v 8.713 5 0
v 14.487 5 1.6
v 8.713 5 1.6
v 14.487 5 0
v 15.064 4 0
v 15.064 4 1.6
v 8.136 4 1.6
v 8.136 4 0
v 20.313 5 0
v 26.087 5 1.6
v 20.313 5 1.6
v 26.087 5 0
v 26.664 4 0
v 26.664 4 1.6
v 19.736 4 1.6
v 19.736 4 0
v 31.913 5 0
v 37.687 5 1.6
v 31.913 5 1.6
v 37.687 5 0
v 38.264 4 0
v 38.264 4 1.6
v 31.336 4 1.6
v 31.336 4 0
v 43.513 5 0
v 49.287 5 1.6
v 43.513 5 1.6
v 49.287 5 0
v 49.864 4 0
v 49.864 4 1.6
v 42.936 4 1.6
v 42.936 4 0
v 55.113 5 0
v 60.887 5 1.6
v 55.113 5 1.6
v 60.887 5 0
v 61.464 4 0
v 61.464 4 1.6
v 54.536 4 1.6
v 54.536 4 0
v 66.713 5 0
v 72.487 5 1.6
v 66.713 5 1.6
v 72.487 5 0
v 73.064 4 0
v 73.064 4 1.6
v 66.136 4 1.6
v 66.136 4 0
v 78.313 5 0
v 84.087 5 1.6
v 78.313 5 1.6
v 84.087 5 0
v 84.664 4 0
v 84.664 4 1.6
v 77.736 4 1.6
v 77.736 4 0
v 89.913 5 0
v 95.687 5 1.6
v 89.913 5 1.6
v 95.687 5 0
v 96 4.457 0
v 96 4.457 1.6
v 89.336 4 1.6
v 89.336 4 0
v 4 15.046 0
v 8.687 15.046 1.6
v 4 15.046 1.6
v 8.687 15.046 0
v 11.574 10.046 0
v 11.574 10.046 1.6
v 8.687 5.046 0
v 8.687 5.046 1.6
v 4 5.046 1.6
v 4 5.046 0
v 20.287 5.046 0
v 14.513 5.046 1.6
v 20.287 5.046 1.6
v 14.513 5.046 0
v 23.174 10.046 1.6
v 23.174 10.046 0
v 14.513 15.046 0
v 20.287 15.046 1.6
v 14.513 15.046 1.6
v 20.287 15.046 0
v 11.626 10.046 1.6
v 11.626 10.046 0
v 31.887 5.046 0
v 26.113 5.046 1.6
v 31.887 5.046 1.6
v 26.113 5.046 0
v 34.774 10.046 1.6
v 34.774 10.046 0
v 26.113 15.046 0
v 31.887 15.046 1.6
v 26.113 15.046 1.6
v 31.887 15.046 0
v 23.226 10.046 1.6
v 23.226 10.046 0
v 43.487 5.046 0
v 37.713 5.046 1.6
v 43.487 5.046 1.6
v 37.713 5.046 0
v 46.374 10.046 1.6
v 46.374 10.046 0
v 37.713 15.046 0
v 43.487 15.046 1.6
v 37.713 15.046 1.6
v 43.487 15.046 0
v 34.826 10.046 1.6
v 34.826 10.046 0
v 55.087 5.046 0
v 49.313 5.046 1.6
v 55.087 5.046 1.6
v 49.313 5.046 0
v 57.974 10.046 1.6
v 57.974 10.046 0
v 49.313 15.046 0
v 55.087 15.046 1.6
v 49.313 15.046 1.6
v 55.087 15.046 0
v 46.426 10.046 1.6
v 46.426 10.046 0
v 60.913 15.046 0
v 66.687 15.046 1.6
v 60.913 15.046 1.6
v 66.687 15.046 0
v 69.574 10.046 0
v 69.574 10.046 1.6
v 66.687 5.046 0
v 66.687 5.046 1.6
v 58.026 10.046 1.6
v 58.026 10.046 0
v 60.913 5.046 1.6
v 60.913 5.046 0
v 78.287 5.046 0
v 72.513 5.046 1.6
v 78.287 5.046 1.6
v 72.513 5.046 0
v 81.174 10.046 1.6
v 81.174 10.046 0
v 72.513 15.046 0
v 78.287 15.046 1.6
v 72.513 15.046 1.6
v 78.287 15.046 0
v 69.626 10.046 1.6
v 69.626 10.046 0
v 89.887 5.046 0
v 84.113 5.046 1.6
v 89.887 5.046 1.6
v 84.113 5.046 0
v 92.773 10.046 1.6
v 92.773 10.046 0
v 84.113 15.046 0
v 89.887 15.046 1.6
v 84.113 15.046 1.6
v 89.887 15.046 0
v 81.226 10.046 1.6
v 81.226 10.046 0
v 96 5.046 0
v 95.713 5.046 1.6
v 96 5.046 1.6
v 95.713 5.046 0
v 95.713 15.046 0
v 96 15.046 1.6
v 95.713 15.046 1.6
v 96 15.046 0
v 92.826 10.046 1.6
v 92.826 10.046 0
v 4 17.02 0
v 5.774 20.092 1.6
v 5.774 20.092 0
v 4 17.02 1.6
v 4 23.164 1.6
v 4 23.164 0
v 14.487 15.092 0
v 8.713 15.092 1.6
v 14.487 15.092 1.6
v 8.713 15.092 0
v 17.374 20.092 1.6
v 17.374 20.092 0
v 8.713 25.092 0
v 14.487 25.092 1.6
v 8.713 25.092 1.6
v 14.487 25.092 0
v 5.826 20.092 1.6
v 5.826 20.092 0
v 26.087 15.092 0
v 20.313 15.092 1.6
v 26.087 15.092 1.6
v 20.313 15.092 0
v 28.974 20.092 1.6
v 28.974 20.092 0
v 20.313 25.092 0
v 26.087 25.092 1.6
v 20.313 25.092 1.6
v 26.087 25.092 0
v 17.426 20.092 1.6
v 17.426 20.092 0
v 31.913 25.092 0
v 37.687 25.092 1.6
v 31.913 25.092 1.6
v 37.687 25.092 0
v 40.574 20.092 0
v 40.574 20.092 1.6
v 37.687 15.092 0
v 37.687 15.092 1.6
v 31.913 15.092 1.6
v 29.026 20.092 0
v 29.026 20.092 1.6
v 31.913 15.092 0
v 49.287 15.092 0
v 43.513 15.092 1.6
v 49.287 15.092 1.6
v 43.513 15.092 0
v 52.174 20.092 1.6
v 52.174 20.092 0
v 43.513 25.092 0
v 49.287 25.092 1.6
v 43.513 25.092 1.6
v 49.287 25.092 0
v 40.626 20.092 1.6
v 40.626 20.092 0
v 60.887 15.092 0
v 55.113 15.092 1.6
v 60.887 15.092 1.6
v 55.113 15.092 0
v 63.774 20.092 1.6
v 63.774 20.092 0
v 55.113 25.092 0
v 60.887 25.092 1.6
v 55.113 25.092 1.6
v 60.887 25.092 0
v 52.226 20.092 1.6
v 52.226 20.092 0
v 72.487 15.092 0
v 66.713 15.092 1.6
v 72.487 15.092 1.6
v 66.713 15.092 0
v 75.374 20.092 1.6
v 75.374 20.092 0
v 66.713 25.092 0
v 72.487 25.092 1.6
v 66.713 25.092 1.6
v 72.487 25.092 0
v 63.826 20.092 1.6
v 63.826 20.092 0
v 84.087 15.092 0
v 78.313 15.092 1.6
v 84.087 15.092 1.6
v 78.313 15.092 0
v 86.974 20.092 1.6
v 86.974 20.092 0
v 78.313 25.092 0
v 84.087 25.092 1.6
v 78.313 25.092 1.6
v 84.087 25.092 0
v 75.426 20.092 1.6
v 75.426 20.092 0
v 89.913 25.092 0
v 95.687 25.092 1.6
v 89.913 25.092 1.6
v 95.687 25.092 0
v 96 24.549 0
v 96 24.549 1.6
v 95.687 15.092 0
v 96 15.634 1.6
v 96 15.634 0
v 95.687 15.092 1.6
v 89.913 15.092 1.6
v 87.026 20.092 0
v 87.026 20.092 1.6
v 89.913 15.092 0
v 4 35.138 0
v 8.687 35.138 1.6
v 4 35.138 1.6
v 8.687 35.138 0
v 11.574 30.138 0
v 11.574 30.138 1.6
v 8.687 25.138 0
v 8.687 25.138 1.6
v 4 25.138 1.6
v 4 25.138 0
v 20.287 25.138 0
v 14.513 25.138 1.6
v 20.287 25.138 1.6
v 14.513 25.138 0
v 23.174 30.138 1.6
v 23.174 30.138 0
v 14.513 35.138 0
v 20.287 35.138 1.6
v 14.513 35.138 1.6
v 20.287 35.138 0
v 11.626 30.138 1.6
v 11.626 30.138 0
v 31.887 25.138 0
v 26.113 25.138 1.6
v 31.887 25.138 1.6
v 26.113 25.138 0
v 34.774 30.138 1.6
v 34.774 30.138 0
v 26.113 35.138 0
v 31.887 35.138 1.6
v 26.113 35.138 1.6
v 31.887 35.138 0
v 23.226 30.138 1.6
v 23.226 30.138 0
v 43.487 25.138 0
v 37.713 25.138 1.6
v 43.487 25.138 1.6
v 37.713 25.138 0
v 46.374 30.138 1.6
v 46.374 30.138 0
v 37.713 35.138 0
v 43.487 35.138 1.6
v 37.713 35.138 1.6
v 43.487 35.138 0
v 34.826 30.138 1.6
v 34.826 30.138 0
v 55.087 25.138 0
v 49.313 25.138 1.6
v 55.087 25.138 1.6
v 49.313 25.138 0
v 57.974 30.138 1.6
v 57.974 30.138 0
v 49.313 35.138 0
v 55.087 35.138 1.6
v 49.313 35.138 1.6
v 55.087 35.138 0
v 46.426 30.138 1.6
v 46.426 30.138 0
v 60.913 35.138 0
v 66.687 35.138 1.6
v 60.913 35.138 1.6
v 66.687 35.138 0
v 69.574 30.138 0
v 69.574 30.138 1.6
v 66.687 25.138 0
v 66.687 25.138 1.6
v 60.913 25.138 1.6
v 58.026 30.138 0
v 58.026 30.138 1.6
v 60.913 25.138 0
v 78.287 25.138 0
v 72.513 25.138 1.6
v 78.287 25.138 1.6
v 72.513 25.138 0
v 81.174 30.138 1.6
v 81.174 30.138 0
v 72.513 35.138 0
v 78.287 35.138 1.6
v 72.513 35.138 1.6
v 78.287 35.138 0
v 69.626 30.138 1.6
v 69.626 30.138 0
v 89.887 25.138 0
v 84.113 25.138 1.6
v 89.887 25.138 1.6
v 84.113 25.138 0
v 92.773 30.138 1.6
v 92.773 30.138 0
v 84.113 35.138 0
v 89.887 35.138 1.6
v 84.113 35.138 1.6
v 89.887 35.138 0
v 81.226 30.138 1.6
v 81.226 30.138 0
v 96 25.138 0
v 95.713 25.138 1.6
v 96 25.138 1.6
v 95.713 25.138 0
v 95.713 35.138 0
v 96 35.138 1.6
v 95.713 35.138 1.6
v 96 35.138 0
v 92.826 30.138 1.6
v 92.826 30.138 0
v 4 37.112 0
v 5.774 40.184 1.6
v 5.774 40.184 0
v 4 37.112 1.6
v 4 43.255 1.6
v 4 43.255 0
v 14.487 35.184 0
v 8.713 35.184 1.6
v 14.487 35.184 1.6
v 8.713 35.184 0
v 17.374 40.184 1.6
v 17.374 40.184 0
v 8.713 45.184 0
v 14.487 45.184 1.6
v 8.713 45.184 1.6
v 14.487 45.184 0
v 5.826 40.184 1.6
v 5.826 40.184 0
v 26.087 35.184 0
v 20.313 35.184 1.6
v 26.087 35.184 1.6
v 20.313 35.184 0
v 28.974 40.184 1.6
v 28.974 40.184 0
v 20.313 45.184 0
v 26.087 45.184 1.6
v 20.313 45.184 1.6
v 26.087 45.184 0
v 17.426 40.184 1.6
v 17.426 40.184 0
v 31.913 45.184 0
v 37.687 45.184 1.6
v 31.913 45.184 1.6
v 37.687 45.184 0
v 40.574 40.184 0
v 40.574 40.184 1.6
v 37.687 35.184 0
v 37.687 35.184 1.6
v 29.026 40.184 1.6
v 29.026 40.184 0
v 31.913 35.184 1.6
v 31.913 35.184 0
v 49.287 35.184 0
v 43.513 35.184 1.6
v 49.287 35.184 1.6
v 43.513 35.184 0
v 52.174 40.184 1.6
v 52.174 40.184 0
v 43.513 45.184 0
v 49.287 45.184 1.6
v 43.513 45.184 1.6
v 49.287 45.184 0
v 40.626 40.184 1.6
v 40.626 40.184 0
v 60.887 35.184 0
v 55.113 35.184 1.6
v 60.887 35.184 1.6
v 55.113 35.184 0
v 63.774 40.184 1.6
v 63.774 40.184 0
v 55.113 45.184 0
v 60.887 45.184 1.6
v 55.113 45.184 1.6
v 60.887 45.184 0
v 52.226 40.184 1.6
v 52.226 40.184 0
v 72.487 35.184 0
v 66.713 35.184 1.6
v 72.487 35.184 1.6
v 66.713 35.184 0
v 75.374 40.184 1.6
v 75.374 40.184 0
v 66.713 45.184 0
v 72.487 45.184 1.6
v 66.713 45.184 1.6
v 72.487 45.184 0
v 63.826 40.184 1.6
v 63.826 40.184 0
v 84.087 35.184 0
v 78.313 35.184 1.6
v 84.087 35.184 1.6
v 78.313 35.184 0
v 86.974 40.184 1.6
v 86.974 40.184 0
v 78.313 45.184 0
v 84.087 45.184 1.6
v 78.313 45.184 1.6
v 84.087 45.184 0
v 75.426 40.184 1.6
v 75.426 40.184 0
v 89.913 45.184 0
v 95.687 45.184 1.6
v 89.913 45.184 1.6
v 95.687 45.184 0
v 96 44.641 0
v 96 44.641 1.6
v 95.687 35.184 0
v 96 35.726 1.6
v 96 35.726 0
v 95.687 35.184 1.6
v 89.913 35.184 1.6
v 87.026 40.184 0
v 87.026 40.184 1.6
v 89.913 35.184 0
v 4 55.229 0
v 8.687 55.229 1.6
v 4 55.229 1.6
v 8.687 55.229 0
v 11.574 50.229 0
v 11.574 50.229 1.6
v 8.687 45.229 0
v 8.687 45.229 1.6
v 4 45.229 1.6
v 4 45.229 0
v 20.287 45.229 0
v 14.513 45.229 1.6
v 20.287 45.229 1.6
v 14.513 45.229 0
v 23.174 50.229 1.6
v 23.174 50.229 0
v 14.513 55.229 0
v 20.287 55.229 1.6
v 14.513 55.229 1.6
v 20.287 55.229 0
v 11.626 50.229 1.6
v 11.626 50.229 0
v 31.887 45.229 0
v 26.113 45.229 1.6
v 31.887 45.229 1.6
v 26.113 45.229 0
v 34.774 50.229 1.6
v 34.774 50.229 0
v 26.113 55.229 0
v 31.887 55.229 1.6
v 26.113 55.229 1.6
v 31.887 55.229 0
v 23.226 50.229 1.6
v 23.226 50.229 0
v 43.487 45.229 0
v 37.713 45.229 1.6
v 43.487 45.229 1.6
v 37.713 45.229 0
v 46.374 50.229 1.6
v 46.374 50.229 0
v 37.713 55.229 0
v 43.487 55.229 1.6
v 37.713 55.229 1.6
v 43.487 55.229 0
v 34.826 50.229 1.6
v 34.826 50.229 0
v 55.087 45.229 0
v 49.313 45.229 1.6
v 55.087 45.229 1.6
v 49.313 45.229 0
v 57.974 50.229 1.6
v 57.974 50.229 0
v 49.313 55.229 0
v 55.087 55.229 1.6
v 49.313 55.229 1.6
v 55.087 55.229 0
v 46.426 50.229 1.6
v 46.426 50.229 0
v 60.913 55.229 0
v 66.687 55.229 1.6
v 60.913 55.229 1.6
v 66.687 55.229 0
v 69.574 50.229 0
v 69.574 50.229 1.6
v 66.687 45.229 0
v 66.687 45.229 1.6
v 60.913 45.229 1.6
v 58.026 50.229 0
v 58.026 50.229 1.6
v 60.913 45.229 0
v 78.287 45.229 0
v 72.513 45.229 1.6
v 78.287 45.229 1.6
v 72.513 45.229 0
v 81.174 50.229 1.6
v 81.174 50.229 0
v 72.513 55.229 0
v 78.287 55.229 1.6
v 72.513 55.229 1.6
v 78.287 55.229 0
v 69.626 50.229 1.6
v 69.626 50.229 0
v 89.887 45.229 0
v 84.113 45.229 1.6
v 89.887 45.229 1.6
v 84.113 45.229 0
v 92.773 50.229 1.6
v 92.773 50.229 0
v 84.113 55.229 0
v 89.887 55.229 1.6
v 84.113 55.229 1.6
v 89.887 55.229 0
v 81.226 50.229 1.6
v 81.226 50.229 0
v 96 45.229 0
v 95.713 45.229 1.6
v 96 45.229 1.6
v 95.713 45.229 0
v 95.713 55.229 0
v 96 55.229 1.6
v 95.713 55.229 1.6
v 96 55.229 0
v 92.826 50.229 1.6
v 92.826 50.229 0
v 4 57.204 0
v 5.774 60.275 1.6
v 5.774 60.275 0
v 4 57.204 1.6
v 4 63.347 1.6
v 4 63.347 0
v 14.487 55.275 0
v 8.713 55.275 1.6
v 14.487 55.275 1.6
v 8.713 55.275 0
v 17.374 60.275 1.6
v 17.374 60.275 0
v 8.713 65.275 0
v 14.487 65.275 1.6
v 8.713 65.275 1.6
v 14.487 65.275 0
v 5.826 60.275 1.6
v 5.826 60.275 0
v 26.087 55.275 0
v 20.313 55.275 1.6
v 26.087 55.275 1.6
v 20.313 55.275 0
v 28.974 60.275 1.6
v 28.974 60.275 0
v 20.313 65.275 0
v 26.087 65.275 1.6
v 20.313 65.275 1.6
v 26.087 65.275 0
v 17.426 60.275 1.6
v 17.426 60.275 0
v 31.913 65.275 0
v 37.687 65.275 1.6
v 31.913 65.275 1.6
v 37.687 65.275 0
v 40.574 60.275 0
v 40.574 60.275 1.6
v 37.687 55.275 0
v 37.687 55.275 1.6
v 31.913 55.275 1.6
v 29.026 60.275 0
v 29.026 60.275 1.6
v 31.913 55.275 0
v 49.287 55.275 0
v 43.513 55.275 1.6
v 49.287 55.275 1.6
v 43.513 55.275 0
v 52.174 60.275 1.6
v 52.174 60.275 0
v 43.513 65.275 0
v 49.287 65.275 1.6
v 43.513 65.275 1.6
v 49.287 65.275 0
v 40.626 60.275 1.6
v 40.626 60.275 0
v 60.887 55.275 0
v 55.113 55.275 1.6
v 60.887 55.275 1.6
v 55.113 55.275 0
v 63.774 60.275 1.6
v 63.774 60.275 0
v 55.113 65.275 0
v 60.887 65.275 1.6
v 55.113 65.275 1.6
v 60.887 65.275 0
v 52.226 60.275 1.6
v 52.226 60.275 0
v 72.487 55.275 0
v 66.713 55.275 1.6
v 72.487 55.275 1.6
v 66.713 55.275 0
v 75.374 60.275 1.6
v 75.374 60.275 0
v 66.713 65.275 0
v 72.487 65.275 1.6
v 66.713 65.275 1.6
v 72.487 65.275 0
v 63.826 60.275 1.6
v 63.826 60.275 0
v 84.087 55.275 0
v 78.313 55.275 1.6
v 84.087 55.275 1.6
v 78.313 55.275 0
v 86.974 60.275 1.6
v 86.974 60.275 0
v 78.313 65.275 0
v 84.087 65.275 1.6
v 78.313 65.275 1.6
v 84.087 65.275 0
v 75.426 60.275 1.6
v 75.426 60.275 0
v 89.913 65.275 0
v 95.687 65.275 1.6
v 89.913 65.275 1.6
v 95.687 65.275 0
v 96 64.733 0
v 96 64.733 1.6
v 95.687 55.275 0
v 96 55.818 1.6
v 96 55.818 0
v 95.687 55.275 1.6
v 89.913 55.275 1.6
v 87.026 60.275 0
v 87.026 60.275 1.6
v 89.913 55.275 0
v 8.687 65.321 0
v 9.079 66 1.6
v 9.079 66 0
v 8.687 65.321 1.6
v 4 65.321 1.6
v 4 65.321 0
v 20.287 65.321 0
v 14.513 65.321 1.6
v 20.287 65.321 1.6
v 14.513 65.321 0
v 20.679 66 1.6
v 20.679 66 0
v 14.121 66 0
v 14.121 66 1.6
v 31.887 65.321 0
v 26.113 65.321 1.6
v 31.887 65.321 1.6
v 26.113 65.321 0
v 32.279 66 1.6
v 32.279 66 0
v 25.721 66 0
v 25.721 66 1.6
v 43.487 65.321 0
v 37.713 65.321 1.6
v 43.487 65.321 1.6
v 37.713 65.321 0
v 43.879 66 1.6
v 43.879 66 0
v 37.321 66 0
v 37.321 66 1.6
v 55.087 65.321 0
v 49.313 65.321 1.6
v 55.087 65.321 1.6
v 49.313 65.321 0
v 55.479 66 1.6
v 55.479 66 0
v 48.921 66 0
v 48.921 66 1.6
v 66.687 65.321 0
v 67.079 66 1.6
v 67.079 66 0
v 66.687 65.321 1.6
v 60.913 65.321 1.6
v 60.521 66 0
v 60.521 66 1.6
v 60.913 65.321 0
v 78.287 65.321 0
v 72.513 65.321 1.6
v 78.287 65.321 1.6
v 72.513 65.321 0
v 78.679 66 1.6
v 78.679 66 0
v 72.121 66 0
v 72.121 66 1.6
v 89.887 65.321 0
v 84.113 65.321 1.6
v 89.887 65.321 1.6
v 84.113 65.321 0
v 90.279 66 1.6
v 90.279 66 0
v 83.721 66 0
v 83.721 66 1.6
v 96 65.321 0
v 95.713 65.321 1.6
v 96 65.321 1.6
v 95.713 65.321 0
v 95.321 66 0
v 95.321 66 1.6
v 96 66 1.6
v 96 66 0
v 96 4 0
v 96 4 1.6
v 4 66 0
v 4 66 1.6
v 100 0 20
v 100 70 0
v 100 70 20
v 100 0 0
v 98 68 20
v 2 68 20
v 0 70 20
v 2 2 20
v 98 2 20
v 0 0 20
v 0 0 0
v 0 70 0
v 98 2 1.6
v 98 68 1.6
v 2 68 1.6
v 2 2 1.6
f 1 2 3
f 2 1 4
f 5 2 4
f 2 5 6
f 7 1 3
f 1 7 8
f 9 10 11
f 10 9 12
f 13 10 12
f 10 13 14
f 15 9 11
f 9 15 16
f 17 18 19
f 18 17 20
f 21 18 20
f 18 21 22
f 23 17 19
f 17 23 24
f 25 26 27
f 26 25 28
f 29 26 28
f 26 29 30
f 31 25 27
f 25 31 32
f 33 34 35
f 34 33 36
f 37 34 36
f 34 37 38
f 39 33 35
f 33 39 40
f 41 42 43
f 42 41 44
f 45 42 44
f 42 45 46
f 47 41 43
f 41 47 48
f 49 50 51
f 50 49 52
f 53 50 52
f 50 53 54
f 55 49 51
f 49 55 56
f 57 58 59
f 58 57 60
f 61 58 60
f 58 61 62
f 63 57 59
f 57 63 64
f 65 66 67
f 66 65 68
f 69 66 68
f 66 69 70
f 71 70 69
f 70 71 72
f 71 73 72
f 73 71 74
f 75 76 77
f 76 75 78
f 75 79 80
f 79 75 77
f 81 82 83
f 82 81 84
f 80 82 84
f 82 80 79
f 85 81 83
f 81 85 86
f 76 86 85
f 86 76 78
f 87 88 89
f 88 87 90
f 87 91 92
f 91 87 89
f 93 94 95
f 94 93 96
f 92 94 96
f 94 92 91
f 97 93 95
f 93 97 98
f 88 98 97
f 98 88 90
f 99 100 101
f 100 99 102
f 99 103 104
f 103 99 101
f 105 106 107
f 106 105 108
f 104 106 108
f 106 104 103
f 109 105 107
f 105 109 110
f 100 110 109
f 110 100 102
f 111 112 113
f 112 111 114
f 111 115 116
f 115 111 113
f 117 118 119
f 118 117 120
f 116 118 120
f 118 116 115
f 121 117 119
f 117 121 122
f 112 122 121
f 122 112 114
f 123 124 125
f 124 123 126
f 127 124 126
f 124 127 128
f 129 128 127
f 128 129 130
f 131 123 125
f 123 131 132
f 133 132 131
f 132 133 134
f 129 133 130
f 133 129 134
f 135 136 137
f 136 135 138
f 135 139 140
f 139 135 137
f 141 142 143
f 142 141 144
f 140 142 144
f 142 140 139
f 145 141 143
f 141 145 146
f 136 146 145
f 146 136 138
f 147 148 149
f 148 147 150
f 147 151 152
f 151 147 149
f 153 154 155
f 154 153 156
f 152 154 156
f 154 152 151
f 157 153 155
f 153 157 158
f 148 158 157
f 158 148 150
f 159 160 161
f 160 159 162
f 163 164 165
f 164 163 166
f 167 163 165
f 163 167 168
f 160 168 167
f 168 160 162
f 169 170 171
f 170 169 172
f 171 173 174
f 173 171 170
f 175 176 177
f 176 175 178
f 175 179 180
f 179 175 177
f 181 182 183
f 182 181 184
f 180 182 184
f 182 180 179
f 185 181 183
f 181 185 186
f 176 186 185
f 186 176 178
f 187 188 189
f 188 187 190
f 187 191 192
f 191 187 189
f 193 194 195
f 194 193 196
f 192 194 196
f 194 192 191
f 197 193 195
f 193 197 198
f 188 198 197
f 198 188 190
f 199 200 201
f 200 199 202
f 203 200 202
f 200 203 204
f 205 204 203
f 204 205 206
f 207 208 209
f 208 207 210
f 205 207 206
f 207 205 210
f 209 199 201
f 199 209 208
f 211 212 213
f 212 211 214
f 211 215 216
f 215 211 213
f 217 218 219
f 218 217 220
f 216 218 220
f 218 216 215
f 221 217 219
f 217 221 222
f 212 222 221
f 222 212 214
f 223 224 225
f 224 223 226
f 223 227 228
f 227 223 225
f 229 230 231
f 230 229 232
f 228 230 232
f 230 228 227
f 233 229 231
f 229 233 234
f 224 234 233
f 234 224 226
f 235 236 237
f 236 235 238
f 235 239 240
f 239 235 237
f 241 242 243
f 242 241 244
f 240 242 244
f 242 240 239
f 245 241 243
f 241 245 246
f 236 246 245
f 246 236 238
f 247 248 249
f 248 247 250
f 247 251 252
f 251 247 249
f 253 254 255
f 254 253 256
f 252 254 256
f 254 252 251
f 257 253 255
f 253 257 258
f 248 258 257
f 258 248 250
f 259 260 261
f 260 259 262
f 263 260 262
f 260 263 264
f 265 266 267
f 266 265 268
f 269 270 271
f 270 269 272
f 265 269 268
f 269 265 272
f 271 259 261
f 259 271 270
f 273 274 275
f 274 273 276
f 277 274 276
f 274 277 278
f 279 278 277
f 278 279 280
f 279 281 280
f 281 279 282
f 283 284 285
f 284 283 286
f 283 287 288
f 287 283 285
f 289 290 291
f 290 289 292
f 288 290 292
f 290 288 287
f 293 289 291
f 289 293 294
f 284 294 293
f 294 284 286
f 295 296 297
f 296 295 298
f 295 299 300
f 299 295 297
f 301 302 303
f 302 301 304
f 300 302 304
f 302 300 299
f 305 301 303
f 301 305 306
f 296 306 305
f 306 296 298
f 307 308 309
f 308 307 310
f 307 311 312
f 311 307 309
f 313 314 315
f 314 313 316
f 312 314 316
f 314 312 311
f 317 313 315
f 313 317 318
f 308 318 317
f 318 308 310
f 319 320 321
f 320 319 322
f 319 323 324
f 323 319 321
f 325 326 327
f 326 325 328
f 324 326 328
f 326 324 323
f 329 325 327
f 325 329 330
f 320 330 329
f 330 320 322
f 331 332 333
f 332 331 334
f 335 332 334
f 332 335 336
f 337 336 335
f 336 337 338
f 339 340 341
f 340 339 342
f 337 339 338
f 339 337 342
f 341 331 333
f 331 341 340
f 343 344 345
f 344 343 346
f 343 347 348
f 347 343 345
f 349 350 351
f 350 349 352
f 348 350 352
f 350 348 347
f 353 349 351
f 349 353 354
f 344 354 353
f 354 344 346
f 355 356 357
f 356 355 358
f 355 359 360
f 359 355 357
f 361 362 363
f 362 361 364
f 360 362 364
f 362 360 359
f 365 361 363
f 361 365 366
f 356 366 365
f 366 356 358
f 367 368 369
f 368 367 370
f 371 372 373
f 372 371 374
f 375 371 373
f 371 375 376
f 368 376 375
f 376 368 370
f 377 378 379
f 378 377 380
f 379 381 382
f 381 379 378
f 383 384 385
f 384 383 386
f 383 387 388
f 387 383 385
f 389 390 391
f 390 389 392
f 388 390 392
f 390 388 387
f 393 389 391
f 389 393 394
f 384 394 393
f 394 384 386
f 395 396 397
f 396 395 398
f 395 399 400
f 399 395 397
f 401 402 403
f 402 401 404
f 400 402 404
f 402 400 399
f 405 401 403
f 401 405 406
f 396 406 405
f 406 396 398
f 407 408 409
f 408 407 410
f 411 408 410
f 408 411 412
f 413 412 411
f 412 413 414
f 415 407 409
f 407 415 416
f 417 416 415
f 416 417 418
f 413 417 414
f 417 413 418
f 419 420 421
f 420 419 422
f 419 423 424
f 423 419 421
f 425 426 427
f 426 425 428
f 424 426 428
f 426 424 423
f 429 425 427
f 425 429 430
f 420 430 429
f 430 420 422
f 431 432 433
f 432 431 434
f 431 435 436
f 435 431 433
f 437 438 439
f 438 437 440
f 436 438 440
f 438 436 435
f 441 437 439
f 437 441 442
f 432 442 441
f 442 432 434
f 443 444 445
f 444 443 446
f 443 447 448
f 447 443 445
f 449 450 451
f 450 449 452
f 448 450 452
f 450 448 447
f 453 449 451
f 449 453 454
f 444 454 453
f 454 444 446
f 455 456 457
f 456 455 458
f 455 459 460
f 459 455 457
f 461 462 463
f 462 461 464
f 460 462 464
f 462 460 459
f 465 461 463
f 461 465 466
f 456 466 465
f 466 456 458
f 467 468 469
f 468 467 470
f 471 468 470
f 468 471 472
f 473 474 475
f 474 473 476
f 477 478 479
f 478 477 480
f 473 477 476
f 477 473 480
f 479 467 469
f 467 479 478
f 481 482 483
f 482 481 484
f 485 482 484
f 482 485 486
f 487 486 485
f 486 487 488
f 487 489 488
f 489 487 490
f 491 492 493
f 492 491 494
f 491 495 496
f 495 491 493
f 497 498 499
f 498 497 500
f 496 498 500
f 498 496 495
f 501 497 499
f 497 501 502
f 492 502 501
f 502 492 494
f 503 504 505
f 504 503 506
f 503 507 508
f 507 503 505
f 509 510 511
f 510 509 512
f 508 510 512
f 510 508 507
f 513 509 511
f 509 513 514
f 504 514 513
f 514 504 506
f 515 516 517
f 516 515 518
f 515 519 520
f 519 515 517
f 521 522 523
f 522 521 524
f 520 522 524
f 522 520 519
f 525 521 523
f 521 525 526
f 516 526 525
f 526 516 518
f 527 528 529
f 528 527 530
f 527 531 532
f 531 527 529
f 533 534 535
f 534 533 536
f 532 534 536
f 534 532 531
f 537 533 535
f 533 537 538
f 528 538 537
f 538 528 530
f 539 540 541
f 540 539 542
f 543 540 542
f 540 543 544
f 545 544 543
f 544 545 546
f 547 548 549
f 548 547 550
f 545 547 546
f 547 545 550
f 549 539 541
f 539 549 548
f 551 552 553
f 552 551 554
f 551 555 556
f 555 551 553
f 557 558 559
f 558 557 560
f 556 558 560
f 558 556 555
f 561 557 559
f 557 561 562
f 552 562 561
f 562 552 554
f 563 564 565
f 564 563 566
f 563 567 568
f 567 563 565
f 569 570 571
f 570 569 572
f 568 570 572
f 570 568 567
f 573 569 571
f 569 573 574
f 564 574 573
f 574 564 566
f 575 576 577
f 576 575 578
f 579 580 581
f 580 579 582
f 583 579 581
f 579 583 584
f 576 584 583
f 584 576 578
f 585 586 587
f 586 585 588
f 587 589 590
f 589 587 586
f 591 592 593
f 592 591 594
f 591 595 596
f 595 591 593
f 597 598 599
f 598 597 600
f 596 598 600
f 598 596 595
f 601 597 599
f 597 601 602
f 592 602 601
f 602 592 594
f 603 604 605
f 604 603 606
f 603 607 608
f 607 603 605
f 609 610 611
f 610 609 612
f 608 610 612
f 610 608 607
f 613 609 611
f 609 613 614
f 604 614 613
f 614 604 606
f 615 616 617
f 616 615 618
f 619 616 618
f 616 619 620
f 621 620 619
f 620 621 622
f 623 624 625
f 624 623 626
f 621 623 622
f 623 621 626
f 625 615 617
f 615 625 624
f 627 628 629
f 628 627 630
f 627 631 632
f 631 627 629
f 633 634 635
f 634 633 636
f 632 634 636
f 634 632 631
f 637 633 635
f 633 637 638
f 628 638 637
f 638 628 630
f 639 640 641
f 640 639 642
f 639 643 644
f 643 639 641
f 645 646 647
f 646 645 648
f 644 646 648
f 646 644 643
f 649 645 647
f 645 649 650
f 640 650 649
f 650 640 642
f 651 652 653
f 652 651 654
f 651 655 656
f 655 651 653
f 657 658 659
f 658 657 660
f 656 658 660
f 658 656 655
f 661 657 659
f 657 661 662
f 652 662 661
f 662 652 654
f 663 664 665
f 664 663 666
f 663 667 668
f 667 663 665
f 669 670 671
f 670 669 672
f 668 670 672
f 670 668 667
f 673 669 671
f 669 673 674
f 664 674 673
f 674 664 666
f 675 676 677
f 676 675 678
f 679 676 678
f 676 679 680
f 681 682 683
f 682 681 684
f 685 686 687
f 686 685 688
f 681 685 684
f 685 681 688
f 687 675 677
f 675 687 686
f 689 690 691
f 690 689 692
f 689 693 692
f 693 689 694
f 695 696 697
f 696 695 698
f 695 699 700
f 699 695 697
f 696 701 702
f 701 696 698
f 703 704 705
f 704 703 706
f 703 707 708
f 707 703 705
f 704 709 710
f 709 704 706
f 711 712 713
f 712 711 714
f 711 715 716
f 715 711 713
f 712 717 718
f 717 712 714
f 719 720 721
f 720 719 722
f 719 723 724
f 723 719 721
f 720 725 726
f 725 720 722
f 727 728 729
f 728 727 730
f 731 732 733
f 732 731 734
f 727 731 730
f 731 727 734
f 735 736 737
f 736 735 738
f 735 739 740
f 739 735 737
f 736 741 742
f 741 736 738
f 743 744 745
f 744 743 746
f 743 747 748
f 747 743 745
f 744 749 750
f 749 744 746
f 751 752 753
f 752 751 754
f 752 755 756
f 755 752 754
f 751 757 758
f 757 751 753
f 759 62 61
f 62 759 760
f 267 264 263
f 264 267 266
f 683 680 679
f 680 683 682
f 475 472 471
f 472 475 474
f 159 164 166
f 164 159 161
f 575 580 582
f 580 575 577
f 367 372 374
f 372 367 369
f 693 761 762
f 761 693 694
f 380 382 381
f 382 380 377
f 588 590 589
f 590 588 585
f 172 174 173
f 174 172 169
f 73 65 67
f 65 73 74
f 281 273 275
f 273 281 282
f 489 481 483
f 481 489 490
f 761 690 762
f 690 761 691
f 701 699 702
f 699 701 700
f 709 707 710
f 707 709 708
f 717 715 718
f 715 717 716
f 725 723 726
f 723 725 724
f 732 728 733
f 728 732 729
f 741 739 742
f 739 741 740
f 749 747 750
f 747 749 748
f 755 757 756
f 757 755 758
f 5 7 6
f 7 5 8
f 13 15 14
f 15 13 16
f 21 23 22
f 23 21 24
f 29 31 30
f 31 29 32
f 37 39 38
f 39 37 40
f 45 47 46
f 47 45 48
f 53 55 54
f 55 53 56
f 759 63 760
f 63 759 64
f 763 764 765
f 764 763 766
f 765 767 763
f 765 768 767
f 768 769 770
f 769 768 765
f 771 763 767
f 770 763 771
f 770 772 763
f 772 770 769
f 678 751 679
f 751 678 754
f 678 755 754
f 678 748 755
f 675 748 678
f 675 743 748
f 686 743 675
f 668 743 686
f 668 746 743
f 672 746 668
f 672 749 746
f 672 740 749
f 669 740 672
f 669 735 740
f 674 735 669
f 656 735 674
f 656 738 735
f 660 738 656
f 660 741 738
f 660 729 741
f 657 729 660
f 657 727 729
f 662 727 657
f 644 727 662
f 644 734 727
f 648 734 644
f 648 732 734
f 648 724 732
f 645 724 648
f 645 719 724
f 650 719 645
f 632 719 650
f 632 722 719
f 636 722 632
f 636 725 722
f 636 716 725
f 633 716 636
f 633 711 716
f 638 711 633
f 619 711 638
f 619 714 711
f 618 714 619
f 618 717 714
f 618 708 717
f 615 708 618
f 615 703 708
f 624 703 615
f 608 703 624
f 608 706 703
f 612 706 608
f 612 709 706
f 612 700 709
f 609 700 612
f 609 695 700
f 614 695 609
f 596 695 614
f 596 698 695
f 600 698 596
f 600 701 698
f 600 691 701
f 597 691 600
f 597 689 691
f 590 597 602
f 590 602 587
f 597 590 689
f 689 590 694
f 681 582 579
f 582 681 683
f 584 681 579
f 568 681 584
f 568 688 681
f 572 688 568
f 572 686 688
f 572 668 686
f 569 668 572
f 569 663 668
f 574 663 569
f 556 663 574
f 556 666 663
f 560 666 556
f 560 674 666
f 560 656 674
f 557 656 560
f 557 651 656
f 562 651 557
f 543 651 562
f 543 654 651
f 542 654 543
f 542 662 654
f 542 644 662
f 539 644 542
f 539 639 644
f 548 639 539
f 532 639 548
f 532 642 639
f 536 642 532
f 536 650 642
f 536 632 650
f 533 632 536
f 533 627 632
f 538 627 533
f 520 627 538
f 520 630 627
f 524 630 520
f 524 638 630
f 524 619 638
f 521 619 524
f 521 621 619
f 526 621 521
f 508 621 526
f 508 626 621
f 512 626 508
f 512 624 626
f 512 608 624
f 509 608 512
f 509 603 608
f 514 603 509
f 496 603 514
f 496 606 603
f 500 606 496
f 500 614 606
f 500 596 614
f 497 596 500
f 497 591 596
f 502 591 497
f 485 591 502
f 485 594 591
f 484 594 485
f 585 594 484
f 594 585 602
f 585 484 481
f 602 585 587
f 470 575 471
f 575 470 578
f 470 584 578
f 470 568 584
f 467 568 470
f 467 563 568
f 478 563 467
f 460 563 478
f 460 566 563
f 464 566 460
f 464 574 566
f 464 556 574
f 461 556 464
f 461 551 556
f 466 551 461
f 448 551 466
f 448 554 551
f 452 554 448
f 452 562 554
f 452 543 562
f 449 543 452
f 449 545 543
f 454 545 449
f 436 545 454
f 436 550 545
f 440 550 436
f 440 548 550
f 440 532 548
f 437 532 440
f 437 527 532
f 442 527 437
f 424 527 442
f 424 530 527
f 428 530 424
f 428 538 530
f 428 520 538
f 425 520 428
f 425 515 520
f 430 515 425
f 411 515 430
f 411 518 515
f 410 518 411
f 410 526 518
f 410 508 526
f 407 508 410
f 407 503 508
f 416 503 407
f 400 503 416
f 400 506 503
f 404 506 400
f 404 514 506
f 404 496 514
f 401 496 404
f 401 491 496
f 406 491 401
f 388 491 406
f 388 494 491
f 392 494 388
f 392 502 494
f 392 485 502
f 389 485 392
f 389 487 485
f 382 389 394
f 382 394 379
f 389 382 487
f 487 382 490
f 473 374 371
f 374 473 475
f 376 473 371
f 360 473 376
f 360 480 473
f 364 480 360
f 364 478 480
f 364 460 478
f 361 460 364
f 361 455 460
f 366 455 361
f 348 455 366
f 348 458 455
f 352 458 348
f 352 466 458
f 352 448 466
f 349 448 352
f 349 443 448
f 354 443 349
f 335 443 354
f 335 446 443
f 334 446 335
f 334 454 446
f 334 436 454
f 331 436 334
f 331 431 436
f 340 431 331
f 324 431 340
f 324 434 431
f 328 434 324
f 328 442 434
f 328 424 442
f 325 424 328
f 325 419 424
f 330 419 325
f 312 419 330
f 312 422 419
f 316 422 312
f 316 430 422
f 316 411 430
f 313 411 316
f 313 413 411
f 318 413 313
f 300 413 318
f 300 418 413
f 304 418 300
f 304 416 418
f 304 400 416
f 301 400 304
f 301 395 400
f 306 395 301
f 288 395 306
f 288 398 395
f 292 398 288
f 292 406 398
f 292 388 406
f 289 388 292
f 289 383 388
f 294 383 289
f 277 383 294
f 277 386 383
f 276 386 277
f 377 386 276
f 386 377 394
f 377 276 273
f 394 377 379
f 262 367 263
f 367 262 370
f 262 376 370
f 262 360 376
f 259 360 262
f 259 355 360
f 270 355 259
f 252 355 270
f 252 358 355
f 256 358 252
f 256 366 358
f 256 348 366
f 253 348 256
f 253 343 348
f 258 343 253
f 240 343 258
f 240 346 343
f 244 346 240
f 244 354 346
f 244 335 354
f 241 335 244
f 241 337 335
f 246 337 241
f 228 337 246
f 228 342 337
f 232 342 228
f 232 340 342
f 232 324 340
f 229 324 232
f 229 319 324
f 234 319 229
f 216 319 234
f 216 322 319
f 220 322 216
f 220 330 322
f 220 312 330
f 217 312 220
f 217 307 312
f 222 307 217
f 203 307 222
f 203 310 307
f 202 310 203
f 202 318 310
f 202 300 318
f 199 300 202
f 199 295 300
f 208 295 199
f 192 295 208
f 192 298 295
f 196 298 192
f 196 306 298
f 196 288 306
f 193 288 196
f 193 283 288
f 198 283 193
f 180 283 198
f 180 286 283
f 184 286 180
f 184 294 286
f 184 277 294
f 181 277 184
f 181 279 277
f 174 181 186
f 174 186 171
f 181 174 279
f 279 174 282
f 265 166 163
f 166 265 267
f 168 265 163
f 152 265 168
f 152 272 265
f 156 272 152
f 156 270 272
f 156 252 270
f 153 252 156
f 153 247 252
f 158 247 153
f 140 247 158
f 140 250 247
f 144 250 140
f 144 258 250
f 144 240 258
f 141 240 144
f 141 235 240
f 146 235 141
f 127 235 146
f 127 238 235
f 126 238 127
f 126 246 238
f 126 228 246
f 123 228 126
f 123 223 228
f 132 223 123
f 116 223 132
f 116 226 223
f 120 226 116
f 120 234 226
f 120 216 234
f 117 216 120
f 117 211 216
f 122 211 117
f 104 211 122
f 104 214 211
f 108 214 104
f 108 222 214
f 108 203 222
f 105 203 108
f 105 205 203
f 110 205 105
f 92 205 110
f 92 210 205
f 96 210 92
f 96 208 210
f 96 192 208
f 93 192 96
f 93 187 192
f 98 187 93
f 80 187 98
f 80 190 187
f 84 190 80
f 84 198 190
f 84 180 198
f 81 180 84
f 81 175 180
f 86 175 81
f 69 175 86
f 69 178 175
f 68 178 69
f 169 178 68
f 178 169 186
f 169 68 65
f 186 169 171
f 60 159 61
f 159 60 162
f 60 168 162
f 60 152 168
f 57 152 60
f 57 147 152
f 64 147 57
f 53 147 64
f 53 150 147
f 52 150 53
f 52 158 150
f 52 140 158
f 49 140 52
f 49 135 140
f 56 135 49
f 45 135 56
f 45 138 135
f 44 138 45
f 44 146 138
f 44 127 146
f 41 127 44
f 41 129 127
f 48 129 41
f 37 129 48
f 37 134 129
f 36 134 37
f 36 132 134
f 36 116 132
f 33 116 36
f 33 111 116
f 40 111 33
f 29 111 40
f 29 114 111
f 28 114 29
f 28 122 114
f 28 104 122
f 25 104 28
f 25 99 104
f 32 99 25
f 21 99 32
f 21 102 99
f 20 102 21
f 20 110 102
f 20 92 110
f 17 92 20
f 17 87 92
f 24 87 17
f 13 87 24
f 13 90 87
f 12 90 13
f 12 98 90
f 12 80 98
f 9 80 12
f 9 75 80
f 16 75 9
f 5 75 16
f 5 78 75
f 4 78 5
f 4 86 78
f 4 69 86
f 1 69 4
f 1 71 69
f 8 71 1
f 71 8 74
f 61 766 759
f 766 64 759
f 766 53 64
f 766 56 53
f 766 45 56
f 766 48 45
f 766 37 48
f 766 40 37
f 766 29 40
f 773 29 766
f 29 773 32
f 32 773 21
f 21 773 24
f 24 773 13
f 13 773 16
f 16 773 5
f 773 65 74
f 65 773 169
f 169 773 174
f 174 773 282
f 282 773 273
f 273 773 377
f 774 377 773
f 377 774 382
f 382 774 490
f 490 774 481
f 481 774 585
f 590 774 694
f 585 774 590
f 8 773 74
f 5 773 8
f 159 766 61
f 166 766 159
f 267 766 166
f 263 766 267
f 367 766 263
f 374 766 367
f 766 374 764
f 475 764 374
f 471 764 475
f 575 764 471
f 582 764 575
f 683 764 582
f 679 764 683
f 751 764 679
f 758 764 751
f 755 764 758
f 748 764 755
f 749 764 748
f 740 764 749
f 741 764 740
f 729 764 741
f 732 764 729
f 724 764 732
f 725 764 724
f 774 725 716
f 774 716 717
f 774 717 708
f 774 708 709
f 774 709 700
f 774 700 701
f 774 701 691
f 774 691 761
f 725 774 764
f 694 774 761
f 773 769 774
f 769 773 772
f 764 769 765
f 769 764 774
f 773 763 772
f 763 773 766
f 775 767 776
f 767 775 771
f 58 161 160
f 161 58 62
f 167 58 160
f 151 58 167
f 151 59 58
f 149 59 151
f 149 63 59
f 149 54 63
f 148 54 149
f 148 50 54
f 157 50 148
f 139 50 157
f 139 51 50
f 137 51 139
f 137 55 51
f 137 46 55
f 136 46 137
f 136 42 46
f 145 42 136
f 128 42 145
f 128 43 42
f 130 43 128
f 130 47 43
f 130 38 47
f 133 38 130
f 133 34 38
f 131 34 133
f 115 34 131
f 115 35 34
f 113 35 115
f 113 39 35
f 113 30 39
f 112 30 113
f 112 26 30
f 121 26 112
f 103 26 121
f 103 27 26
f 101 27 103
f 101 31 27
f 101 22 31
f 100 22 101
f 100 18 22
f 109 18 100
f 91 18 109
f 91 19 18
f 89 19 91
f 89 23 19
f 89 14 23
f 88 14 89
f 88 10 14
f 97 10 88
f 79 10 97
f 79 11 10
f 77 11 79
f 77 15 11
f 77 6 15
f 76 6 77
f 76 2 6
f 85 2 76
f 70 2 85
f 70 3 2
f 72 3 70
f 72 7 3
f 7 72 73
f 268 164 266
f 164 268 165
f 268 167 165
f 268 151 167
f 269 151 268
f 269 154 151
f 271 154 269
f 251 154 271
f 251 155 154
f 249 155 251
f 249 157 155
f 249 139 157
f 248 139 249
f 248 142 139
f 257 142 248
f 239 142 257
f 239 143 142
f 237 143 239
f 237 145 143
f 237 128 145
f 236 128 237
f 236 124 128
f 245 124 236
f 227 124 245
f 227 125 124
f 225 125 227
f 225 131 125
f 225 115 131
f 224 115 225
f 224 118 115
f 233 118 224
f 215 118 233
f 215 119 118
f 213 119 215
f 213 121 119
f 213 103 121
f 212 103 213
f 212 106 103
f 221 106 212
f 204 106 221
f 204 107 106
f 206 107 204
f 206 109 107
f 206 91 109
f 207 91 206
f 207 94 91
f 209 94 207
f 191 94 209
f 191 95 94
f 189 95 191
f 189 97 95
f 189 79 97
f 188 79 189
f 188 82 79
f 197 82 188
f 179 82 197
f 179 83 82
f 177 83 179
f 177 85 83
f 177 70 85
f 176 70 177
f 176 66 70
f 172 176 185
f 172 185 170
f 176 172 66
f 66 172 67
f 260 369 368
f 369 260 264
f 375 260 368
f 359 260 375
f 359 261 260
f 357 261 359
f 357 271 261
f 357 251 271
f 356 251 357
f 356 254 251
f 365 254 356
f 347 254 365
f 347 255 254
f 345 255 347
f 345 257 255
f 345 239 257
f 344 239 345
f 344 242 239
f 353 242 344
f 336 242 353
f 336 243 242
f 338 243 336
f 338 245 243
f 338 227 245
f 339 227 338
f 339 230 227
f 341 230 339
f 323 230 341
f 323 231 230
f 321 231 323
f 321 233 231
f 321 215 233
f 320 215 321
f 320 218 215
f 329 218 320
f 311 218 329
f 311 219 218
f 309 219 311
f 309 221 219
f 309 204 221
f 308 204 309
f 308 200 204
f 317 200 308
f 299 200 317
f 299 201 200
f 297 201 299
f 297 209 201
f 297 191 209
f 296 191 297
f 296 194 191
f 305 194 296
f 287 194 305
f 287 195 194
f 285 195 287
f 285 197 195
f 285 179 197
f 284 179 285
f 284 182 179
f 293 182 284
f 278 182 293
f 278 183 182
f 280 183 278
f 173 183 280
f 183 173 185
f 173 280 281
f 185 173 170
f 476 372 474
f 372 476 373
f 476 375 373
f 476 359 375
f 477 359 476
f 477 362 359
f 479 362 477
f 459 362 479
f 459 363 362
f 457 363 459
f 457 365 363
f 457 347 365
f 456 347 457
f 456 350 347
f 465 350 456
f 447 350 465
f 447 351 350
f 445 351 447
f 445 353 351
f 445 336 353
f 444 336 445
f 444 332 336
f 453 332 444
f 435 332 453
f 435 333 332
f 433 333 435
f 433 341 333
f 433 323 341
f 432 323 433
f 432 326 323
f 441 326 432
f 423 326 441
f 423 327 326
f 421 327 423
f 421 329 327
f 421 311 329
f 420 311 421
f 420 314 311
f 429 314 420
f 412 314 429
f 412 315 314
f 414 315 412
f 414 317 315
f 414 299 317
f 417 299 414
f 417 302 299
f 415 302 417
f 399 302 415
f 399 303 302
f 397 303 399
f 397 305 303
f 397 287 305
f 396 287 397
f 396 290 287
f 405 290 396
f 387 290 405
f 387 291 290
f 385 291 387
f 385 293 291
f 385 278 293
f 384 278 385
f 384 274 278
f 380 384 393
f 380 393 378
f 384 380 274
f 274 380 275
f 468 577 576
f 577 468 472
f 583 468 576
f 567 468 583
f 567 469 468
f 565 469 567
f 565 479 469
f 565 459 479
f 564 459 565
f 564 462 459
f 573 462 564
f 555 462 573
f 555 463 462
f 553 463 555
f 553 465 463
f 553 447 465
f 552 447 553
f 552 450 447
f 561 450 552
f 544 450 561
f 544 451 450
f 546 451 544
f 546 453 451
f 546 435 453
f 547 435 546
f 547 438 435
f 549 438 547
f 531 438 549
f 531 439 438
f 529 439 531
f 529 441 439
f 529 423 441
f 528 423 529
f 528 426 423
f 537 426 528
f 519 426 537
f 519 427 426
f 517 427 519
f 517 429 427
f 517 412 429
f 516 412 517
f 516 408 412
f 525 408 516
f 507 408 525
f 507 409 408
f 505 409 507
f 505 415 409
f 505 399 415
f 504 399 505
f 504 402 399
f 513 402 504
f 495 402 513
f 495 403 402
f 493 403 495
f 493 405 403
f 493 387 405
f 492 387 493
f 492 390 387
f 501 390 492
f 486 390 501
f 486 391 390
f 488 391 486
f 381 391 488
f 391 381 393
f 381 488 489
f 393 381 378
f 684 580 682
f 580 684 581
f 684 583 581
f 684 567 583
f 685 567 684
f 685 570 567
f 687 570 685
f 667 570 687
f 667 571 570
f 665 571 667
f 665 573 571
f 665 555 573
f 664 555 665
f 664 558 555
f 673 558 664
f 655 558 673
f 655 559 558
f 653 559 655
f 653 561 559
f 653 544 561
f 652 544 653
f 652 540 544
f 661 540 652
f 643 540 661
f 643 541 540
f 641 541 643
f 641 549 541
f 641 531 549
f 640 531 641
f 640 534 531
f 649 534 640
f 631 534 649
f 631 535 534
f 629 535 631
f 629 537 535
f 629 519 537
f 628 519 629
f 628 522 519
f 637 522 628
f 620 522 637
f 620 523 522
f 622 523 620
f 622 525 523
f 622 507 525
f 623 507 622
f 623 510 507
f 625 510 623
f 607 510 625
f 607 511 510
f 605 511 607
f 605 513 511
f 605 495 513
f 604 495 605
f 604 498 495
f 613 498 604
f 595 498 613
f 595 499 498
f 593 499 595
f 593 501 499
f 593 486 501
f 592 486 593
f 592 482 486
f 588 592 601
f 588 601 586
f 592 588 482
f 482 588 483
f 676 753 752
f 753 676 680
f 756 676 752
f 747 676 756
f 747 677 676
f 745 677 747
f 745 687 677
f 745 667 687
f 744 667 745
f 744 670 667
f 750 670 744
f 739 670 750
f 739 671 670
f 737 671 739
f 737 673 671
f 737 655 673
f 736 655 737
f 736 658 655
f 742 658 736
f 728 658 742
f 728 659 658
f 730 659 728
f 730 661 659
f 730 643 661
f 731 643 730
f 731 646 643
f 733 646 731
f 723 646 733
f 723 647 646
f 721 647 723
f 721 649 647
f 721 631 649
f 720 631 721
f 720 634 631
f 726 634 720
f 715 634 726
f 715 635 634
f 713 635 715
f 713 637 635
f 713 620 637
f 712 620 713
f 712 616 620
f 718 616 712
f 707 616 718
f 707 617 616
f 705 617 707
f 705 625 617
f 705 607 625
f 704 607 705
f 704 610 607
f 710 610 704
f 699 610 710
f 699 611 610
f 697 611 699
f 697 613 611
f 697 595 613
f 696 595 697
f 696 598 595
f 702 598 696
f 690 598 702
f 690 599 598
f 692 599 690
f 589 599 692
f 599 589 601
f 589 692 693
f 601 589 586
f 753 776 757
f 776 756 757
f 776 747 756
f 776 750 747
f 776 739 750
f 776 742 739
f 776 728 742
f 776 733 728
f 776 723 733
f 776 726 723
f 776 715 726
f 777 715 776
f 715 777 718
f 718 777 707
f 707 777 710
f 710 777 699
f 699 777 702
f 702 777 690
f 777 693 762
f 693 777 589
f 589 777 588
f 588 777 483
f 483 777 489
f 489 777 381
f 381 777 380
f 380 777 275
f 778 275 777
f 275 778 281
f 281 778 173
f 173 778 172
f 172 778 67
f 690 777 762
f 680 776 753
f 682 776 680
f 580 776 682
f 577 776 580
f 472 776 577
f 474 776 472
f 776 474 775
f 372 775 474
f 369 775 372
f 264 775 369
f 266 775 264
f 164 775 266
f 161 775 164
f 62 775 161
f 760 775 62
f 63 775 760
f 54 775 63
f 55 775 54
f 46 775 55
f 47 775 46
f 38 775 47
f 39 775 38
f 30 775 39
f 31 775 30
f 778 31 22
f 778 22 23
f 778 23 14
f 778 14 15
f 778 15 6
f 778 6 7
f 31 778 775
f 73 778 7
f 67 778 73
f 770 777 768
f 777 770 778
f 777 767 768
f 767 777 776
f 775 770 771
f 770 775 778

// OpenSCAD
// file: lib/hex.scad
// Shared helper for honeycomb-tray.scad. Tests include<> with a relative path.

module hex_grid(length, width, cell, web, h) {
    dx = cell + web;
    dy = dx * sqrt(3) / 2;
    for (row = [0 : ceil(width / dy)], col = [0 : ceil(length / dx)])
        translate([col * dx + (row % 2) * dx / 2, row * dy, 0])
            cylinder(d = cell * 2 / sqrt(3), h = h, $fn = 6);
}
// main file
// Tray with a honeycomb floor. Tests many holes per layer and thin walls.
include <lib/hex.scad>

/* [Tray] */
length = 100; // [30:1:200]
width = 70; // [30:1:200]
height = 20; // [5:1:80]
wall = 2; // [0.8:0.2:5]
floor_thickness = 1.6; // [0.6:0.2:5]

/* [Honeycomb] */
cell = 10; // [4:0.5:30]
web = 1.6; // [0.8:0.2:5]

difference() {
    cube([length, width, height]);
    translate([wall, wall, floor_thickness]) cube([length - 2 * wall, width - 2 * wall, height]);
    // Honeycomb cut-outs, clipped to the floor inside the walls.
    intersection() {
        translate([wall * 2, wall * 2, -1]) cube([length - 4 * wall, width - 4 * wall, floor_thickness + 2]);
        translate([0, 0, -1]) hex_grid(length, width, cell, web, floor_thickness + 2);
    }
}
